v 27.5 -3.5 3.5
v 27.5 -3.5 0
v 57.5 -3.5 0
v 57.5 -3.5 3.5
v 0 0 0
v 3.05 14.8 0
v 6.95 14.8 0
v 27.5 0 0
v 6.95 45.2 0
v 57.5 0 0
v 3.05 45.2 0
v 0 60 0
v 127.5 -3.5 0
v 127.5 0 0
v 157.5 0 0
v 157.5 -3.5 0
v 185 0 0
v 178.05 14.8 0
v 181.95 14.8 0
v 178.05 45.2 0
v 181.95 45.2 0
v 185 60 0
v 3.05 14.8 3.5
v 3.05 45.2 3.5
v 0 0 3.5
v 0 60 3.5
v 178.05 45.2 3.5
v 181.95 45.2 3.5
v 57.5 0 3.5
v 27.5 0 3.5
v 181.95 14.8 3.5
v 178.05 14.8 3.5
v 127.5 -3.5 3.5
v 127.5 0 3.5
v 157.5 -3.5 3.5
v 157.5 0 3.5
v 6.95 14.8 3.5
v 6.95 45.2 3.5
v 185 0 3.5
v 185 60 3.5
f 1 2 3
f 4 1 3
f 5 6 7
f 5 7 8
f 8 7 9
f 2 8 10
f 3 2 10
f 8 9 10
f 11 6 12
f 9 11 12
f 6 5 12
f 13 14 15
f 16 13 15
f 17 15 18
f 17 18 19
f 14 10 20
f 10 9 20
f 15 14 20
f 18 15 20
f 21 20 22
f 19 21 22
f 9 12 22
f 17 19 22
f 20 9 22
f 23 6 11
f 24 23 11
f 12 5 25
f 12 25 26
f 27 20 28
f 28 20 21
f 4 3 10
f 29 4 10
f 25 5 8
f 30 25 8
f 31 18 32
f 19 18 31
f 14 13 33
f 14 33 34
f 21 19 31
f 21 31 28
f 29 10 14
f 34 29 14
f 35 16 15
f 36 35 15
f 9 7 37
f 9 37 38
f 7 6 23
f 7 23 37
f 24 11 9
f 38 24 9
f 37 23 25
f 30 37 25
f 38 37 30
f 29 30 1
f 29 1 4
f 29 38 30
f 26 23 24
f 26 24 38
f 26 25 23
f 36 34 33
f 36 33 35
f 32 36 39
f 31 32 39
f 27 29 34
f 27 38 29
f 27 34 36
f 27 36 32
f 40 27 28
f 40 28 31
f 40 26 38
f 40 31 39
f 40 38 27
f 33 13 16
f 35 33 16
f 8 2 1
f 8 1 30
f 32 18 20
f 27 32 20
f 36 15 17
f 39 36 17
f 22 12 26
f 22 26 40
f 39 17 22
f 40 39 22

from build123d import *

# Parameters (mm, degrees)
SKETCH_1_W      = 185
SKETCH_1_H      = 60
SKETCH_1_W_2    = 3.9
SKETCH_1_H_2    = 30.4
SKETCH_1_W_3    = 30
SKETCH_1_H_3    = 3.5
EXTRUDE_1_DEPTH = 3.5


with BuildPart() as part:
    # Эскиз1 → Бобышка-Вытянуть1 (new body)
    # profile 1 of 3: a face of its own
    with BuildSketch(Plane.XY):
        with Locations((92.5, 30)):
            Rectangle(SKETCH_1_W, SKETCH_1_H)
        with Locations((180, 30)):
            Rectangle(SKETCH_1_W_2, SKETCH_1_H_2, mode=Mode.SUBTRACT)
        with Locations((5, 30)):
            Rectangle(SKETCH_1_W_2, SKETCH_1_H_2, mode=Mode.SUBTRACT)
    # profile 2 of 3: a face of its own
    with BuildSketch(Plane.XY):
        with Locations((42.5, -1.75)):
            Rectangle(SKETCH_1_W_3, SKETCH_1_H_3)
    # profile 3 of 3: a face of its own
    with BuildSketch(Plane.XY):
        with Locations((142.5, -1.75)):
            Rectangle(SKETCH_1_W_3, SKETCH_1_H_3)
    extrude(amount=EXTRUDE_1_DEPTH)


solid = part.part
